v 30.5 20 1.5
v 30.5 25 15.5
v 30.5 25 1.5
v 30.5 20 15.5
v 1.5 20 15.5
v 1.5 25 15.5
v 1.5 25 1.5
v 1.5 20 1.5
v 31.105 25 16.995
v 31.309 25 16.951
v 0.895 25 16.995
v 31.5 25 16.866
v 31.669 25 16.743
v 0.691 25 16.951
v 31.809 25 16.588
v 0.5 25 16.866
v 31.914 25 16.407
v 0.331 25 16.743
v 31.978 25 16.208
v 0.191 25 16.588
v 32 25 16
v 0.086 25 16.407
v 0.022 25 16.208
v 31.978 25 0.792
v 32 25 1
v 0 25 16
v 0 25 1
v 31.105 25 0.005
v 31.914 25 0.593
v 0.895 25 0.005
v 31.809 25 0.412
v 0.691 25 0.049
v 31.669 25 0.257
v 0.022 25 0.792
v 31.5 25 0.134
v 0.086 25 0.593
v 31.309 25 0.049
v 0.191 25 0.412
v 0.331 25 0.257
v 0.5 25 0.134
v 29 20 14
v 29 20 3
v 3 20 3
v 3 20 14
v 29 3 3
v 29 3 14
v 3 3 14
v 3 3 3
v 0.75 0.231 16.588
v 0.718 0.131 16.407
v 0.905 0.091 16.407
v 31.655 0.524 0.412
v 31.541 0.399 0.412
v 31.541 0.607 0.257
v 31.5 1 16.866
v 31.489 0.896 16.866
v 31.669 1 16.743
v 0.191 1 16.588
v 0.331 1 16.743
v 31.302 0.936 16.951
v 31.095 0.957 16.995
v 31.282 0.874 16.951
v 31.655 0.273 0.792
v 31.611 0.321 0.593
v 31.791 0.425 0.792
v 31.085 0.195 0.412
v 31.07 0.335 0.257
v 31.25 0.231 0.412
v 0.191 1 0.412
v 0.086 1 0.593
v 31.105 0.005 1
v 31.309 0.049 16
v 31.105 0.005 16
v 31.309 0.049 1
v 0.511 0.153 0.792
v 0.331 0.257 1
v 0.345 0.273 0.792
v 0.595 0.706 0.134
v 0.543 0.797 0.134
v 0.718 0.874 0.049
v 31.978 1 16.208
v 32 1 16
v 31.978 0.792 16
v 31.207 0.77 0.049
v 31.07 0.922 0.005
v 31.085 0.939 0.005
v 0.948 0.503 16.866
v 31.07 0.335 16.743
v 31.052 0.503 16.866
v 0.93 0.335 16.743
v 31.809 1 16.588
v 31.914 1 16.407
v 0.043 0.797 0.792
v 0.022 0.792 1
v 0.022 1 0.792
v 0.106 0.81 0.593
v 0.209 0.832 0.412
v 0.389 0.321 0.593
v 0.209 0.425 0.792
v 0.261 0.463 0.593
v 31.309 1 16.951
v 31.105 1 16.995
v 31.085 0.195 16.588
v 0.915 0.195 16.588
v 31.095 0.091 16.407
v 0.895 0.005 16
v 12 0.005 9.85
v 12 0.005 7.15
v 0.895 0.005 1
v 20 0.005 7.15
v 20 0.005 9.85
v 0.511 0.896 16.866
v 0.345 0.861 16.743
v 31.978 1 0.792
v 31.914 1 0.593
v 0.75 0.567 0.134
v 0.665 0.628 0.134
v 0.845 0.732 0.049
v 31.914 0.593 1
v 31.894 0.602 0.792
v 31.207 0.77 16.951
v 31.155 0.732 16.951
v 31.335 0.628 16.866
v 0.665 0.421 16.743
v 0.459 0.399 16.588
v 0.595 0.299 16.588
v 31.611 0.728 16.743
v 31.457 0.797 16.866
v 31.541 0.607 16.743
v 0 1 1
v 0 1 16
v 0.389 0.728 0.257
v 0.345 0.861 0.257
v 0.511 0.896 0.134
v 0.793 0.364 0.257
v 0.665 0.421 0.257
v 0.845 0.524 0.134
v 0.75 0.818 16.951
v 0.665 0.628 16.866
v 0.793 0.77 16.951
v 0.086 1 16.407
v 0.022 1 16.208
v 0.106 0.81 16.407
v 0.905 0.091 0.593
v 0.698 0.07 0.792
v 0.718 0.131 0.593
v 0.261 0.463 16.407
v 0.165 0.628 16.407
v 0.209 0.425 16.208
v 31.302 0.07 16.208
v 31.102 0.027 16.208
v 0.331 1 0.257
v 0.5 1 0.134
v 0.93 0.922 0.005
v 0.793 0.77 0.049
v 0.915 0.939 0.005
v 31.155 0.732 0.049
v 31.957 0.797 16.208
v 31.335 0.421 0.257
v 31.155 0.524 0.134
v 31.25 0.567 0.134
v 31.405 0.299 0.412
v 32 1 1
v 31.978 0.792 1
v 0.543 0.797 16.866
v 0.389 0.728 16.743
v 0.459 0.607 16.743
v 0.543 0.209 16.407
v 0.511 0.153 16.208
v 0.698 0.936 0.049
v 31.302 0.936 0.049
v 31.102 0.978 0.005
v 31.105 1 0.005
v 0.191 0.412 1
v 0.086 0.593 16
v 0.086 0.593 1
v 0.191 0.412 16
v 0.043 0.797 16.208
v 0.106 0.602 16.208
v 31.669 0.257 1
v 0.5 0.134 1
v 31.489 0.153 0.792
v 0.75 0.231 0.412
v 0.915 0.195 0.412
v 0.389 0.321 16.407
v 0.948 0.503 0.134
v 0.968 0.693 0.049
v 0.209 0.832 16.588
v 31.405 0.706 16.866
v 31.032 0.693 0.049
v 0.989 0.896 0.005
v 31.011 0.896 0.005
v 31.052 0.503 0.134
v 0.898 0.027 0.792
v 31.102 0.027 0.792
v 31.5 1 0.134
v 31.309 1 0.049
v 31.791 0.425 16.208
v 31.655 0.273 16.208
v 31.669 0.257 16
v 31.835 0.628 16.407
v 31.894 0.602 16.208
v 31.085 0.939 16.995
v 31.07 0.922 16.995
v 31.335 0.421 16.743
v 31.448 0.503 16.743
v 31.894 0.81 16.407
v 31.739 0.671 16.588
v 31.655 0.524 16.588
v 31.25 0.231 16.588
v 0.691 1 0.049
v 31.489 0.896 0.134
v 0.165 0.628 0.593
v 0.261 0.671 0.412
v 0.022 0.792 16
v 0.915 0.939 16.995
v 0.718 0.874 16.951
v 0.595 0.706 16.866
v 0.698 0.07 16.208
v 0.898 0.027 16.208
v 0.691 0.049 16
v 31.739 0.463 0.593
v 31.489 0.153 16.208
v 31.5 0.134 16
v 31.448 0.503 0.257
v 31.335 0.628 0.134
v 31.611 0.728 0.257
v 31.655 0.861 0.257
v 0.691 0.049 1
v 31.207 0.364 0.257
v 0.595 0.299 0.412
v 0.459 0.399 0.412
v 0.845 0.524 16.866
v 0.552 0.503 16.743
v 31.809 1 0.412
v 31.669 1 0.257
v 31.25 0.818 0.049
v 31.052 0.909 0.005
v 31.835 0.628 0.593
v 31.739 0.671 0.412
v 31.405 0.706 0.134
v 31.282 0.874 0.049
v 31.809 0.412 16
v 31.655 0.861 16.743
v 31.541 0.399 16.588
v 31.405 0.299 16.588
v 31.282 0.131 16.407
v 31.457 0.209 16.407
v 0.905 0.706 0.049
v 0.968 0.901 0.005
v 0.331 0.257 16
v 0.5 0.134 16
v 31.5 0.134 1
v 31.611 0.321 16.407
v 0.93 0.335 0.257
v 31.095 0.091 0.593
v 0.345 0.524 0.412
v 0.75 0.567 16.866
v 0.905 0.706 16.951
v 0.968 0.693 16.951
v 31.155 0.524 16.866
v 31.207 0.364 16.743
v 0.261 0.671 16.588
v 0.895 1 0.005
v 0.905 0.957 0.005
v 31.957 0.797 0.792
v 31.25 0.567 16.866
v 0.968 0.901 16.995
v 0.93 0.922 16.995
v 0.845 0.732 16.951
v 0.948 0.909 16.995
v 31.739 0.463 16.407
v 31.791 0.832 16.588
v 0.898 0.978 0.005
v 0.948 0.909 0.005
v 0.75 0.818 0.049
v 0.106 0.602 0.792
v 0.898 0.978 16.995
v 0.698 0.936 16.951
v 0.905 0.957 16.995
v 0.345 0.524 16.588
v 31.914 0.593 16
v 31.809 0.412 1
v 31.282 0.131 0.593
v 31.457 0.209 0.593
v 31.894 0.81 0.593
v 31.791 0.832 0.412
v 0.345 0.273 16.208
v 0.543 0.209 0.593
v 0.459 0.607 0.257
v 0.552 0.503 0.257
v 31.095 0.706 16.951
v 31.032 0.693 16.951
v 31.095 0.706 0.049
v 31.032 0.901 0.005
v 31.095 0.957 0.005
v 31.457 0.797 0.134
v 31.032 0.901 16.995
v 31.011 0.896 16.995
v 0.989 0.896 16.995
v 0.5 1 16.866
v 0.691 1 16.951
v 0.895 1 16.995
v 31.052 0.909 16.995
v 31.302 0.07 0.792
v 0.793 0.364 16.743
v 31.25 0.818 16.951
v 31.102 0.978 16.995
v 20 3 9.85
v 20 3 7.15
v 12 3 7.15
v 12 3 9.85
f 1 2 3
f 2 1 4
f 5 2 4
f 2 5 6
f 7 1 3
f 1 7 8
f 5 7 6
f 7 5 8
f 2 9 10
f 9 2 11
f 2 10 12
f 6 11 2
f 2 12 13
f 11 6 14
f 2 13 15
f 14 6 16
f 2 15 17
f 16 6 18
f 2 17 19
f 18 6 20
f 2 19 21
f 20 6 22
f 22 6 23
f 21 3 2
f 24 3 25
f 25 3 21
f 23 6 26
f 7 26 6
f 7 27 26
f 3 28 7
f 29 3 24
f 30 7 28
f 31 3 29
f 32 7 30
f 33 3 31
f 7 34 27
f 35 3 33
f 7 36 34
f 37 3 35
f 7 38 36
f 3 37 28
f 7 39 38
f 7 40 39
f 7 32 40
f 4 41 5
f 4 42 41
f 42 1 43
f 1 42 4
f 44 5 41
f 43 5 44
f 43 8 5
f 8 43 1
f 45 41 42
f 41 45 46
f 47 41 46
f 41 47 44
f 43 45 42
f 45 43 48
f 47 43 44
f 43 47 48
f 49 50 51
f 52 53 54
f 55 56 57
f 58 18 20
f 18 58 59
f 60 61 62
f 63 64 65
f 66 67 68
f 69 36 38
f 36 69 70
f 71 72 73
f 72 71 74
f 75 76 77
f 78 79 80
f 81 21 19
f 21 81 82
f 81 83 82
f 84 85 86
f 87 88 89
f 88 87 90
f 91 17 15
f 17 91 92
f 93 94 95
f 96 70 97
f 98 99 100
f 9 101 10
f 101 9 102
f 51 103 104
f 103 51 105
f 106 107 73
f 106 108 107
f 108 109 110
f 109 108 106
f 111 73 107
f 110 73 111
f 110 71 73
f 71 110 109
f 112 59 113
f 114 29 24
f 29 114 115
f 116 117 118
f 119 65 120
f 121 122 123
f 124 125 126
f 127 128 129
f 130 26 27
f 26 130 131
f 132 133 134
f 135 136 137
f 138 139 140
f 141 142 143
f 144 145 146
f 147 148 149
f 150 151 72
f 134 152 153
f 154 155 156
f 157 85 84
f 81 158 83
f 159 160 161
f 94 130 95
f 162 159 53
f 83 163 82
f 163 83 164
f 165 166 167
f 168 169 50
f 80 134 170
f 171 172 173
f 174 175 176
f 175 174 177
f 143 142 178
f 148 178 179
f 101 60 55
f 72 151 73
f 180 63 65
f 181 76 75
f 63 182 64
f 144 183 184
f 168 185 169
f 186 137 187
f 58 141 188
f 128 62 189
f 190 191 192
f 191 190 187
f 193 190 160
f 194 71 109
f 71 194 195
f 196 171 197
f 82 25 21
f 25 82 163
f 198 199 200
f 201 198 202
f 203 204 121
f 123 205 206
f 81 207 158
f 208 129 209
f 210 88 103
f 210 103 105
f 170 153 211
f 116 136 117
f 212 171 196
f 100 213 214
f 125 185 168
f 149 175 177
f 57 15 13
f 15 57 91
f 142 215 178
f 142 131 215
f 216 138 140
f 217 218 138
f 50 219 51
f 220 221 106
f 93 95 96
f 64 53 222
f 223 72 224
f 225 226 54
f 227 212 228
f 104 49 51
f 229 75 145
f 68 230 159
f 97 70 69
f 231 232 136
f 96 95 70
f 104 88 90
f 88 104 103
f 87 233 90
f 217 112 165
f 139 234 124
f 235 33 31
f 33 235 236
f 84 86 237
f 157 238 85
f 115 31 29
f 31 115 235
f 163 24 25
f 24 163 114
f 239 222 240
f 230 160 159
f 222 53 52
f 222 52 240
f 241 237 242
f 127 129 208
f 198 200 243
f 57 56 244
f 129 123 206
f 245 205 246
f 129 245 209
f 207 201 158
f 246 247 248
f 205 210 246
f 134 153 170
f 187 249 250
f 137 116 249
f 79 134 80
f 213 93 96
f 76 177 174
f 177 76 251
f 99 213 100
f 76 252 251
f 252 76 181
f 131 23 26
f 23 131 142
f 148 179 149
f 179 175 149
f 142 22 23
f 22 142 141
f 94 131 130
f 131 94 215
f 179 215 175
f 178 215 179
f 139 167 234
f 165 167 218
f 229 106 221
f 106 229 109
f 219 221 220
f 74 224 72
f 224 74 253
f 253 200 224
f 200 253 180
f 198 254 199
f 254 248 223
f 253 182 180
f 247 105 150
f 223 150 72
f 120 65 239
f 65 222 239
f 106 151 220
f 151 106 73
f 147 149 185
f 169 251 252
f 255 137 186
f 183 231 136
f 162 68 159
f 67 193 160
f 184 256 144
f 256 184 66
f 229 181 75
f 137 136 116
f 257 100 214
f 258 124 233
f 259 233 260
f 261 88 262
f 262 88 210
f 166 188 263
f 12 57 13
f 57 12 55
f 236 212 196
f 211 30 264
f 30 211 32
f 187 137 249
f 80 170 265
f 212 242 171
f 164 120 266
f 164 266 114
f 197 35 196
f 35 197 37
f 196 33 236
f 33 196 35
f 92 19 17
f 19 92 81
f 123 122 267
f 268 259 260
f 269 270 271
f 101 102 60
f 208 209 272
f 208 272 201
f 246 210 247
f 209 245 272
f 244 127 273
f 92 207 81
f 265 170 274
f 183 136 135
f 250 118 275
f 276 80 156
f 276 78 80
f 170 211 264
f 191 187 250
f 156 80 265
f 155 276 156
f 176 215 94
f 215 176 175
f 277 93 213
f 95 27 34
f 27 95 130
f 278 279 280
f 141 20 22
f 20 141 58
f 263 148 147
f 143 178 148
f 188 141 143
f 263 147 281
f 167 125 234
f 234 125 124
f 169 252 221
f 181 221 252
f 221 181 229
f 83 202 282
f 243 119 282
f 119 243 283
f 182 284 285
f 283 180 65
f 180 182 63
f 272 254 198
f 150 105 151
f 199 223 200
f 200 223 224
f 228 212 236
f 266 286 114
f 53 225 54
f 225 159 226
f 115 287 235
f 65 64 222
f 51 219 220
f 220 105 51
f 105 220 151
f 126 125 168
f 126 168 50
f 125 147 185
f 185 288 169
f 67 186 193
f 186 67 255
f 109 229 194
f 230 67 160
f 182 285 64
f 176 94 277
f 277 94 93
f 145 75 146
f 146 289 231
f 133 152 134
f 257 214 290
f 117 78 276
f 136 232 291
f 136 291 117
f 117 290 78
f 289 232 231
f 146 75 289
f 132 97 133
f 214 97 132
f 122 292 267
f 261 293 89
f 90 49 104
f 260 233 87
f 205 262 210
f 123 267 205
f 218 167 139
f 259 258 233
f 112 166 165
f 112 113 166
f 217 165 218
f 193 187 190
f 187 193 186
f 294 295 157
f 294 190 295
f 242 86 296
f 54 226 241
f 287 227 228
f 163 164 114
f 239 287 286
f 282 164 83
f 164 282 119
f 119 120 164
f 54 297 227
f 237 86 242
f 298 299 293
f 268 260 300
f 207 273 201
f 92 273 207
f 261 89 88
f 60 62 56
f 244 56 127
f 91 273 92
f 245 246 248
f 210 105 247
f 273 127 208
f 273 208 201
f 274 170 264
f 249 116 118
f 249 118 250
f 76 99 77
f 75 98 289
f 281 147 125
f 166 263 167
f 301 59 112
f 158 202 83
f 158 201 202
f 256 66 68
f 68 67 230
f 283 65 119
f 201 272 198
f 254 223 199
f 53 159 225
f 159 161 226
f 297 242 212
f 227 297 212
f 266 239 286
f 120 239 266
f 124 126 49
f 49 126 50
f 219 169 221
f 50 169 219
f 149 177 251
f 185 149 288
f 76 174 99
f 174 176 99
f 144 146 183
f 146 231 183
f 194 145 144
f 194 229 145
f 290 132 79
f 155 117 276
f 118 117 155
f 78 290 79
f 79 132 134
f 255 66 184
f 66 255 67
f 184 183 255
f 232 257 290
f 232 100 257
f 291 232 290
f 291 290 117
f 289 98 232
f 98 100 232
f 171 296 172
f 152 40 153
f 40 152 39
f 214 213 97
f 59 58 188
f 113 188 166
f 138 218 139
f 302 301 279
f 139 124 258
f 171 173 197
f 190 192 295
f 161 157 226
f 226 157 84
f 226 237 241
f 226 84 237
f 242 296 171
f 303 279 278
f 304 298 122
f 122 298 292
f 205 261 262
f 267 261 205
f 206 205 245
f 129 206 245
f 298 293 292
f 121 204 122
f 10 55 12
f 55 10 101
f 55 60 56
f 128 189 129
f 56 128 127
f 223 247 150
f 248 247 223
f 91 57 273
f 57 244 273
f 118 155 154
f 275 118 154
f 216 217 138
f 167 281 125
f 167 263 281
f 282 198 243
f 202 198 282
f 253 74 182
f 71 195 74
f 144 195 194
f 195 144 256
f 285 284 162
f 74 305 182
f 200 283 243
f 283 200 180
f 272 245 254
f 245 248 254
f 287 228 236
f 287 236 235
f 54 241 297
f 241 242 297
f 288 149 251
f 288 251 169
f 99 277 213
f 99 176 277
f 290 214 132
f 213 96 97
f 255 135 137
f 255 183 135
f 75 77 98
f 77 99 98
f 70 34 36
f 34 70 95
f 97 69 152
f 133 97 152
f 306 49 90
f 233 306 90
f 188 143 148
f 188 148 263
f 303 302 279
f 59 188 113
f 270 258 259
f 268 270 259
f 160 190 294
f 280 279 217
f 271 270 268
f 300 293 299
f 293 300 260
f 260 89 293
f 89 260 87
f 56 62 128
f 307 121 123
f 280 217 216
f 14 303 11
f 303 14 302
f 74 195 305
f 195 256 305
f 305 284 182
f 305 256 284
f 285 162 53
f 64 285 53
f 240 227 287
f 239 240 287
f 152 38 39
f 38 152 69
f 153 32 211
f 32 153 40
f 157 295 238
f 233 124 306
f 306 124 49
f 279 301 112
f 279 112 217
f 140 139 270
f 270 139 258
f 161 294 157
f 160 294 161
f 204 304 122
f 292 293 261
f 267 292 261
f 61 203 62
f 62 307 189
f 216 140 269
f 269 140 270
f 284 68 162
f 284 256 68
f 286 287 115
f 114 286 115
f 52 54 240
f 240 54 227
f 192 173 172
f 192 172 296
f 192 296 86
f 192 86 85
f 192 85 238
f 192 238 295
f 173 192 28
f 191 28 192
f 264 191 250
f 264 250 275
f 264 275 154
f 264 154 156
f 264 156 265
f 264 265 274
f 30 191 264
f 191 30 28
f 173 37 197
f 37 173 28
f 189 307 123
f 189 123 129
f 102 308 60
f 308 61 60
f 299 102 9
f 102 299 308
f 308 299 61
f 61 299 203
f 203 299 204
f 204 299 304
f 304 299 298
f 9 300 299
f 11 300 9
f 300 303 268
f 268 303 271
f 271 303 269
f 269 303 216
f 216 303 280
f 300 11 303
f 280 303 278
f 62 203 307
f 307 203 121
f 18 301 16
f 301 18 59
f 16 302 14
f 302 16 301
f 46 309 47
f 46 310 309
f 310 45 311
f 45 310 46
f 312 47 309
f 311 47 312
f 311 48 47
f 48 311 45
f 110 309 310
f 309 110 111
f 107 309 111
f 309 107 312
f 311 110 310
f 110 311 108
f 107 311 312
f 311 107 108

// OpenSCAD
// file: module.scad
cube_height = 10;
cube_width = 10;
cube_depth = 10;

$fs = 0.1;

module rounded_cube (size, d) {
    h = 0.0001;
    translate([d / 2, d / 2, d / 2])
    minkowski () {
        cube([size[0] - d, size[1] - d, size[2] - d], center = false);
        sphere(d = d);
    }
}
// main file
use <module.scad>

cap_height = 17;
cap_width = 32;
cap_length = 25;
prug_height = 2.7;
prug_width = 8;
thin = 3;
cap_round = 2;
margin_cut = 3;
margin_fitting = 5;
margin_thin = 0.0;

module cap_fitting(){
    difference() {
        translate([(thin / 2) - margin_thin, cap_length - margin_fitting, (thin / 2) - margin_thin])
        cube([cap_width - thin + margin_thin * 2, margin_fitting, cap_height - thin + margin_thin * 2]);
        translate([thin, cap_length - margin_fitting, thin])
        cube([cap_width - thin * 2, margin_fitting, cap_height - thin * 2]);
    }
}

module cap_prug(){
    difference() {
        translate([cap_width / 2 , 0, cap_height / 2])
        color([1,0,0]) cube([prug_width, thin * 2, prug_height], center = true);
//        color([1,0,0]) cube([10, 10, 10], center = true);
    }
}

module cap(){
//    union() { // OR
    difference() { // NOR?
//    intersection() { // AND
        rounded_cube([cap_width,cap_length + margin_cut,cap_height], cap_round);
        translate([-margin_cut, cap_length, -margin_cut])
        cube([cap_width + margin_cut  * 2,cap_length + margin_cut * 2,cap_height + margin_cut * 2]);
        translate([thin, thin, thin])
        cube([cap_width - thin * 2, cap_length + 1, cap_height - thin * 2]);
        cap_fitting();
        cap_prug();
    }
}

cap();
